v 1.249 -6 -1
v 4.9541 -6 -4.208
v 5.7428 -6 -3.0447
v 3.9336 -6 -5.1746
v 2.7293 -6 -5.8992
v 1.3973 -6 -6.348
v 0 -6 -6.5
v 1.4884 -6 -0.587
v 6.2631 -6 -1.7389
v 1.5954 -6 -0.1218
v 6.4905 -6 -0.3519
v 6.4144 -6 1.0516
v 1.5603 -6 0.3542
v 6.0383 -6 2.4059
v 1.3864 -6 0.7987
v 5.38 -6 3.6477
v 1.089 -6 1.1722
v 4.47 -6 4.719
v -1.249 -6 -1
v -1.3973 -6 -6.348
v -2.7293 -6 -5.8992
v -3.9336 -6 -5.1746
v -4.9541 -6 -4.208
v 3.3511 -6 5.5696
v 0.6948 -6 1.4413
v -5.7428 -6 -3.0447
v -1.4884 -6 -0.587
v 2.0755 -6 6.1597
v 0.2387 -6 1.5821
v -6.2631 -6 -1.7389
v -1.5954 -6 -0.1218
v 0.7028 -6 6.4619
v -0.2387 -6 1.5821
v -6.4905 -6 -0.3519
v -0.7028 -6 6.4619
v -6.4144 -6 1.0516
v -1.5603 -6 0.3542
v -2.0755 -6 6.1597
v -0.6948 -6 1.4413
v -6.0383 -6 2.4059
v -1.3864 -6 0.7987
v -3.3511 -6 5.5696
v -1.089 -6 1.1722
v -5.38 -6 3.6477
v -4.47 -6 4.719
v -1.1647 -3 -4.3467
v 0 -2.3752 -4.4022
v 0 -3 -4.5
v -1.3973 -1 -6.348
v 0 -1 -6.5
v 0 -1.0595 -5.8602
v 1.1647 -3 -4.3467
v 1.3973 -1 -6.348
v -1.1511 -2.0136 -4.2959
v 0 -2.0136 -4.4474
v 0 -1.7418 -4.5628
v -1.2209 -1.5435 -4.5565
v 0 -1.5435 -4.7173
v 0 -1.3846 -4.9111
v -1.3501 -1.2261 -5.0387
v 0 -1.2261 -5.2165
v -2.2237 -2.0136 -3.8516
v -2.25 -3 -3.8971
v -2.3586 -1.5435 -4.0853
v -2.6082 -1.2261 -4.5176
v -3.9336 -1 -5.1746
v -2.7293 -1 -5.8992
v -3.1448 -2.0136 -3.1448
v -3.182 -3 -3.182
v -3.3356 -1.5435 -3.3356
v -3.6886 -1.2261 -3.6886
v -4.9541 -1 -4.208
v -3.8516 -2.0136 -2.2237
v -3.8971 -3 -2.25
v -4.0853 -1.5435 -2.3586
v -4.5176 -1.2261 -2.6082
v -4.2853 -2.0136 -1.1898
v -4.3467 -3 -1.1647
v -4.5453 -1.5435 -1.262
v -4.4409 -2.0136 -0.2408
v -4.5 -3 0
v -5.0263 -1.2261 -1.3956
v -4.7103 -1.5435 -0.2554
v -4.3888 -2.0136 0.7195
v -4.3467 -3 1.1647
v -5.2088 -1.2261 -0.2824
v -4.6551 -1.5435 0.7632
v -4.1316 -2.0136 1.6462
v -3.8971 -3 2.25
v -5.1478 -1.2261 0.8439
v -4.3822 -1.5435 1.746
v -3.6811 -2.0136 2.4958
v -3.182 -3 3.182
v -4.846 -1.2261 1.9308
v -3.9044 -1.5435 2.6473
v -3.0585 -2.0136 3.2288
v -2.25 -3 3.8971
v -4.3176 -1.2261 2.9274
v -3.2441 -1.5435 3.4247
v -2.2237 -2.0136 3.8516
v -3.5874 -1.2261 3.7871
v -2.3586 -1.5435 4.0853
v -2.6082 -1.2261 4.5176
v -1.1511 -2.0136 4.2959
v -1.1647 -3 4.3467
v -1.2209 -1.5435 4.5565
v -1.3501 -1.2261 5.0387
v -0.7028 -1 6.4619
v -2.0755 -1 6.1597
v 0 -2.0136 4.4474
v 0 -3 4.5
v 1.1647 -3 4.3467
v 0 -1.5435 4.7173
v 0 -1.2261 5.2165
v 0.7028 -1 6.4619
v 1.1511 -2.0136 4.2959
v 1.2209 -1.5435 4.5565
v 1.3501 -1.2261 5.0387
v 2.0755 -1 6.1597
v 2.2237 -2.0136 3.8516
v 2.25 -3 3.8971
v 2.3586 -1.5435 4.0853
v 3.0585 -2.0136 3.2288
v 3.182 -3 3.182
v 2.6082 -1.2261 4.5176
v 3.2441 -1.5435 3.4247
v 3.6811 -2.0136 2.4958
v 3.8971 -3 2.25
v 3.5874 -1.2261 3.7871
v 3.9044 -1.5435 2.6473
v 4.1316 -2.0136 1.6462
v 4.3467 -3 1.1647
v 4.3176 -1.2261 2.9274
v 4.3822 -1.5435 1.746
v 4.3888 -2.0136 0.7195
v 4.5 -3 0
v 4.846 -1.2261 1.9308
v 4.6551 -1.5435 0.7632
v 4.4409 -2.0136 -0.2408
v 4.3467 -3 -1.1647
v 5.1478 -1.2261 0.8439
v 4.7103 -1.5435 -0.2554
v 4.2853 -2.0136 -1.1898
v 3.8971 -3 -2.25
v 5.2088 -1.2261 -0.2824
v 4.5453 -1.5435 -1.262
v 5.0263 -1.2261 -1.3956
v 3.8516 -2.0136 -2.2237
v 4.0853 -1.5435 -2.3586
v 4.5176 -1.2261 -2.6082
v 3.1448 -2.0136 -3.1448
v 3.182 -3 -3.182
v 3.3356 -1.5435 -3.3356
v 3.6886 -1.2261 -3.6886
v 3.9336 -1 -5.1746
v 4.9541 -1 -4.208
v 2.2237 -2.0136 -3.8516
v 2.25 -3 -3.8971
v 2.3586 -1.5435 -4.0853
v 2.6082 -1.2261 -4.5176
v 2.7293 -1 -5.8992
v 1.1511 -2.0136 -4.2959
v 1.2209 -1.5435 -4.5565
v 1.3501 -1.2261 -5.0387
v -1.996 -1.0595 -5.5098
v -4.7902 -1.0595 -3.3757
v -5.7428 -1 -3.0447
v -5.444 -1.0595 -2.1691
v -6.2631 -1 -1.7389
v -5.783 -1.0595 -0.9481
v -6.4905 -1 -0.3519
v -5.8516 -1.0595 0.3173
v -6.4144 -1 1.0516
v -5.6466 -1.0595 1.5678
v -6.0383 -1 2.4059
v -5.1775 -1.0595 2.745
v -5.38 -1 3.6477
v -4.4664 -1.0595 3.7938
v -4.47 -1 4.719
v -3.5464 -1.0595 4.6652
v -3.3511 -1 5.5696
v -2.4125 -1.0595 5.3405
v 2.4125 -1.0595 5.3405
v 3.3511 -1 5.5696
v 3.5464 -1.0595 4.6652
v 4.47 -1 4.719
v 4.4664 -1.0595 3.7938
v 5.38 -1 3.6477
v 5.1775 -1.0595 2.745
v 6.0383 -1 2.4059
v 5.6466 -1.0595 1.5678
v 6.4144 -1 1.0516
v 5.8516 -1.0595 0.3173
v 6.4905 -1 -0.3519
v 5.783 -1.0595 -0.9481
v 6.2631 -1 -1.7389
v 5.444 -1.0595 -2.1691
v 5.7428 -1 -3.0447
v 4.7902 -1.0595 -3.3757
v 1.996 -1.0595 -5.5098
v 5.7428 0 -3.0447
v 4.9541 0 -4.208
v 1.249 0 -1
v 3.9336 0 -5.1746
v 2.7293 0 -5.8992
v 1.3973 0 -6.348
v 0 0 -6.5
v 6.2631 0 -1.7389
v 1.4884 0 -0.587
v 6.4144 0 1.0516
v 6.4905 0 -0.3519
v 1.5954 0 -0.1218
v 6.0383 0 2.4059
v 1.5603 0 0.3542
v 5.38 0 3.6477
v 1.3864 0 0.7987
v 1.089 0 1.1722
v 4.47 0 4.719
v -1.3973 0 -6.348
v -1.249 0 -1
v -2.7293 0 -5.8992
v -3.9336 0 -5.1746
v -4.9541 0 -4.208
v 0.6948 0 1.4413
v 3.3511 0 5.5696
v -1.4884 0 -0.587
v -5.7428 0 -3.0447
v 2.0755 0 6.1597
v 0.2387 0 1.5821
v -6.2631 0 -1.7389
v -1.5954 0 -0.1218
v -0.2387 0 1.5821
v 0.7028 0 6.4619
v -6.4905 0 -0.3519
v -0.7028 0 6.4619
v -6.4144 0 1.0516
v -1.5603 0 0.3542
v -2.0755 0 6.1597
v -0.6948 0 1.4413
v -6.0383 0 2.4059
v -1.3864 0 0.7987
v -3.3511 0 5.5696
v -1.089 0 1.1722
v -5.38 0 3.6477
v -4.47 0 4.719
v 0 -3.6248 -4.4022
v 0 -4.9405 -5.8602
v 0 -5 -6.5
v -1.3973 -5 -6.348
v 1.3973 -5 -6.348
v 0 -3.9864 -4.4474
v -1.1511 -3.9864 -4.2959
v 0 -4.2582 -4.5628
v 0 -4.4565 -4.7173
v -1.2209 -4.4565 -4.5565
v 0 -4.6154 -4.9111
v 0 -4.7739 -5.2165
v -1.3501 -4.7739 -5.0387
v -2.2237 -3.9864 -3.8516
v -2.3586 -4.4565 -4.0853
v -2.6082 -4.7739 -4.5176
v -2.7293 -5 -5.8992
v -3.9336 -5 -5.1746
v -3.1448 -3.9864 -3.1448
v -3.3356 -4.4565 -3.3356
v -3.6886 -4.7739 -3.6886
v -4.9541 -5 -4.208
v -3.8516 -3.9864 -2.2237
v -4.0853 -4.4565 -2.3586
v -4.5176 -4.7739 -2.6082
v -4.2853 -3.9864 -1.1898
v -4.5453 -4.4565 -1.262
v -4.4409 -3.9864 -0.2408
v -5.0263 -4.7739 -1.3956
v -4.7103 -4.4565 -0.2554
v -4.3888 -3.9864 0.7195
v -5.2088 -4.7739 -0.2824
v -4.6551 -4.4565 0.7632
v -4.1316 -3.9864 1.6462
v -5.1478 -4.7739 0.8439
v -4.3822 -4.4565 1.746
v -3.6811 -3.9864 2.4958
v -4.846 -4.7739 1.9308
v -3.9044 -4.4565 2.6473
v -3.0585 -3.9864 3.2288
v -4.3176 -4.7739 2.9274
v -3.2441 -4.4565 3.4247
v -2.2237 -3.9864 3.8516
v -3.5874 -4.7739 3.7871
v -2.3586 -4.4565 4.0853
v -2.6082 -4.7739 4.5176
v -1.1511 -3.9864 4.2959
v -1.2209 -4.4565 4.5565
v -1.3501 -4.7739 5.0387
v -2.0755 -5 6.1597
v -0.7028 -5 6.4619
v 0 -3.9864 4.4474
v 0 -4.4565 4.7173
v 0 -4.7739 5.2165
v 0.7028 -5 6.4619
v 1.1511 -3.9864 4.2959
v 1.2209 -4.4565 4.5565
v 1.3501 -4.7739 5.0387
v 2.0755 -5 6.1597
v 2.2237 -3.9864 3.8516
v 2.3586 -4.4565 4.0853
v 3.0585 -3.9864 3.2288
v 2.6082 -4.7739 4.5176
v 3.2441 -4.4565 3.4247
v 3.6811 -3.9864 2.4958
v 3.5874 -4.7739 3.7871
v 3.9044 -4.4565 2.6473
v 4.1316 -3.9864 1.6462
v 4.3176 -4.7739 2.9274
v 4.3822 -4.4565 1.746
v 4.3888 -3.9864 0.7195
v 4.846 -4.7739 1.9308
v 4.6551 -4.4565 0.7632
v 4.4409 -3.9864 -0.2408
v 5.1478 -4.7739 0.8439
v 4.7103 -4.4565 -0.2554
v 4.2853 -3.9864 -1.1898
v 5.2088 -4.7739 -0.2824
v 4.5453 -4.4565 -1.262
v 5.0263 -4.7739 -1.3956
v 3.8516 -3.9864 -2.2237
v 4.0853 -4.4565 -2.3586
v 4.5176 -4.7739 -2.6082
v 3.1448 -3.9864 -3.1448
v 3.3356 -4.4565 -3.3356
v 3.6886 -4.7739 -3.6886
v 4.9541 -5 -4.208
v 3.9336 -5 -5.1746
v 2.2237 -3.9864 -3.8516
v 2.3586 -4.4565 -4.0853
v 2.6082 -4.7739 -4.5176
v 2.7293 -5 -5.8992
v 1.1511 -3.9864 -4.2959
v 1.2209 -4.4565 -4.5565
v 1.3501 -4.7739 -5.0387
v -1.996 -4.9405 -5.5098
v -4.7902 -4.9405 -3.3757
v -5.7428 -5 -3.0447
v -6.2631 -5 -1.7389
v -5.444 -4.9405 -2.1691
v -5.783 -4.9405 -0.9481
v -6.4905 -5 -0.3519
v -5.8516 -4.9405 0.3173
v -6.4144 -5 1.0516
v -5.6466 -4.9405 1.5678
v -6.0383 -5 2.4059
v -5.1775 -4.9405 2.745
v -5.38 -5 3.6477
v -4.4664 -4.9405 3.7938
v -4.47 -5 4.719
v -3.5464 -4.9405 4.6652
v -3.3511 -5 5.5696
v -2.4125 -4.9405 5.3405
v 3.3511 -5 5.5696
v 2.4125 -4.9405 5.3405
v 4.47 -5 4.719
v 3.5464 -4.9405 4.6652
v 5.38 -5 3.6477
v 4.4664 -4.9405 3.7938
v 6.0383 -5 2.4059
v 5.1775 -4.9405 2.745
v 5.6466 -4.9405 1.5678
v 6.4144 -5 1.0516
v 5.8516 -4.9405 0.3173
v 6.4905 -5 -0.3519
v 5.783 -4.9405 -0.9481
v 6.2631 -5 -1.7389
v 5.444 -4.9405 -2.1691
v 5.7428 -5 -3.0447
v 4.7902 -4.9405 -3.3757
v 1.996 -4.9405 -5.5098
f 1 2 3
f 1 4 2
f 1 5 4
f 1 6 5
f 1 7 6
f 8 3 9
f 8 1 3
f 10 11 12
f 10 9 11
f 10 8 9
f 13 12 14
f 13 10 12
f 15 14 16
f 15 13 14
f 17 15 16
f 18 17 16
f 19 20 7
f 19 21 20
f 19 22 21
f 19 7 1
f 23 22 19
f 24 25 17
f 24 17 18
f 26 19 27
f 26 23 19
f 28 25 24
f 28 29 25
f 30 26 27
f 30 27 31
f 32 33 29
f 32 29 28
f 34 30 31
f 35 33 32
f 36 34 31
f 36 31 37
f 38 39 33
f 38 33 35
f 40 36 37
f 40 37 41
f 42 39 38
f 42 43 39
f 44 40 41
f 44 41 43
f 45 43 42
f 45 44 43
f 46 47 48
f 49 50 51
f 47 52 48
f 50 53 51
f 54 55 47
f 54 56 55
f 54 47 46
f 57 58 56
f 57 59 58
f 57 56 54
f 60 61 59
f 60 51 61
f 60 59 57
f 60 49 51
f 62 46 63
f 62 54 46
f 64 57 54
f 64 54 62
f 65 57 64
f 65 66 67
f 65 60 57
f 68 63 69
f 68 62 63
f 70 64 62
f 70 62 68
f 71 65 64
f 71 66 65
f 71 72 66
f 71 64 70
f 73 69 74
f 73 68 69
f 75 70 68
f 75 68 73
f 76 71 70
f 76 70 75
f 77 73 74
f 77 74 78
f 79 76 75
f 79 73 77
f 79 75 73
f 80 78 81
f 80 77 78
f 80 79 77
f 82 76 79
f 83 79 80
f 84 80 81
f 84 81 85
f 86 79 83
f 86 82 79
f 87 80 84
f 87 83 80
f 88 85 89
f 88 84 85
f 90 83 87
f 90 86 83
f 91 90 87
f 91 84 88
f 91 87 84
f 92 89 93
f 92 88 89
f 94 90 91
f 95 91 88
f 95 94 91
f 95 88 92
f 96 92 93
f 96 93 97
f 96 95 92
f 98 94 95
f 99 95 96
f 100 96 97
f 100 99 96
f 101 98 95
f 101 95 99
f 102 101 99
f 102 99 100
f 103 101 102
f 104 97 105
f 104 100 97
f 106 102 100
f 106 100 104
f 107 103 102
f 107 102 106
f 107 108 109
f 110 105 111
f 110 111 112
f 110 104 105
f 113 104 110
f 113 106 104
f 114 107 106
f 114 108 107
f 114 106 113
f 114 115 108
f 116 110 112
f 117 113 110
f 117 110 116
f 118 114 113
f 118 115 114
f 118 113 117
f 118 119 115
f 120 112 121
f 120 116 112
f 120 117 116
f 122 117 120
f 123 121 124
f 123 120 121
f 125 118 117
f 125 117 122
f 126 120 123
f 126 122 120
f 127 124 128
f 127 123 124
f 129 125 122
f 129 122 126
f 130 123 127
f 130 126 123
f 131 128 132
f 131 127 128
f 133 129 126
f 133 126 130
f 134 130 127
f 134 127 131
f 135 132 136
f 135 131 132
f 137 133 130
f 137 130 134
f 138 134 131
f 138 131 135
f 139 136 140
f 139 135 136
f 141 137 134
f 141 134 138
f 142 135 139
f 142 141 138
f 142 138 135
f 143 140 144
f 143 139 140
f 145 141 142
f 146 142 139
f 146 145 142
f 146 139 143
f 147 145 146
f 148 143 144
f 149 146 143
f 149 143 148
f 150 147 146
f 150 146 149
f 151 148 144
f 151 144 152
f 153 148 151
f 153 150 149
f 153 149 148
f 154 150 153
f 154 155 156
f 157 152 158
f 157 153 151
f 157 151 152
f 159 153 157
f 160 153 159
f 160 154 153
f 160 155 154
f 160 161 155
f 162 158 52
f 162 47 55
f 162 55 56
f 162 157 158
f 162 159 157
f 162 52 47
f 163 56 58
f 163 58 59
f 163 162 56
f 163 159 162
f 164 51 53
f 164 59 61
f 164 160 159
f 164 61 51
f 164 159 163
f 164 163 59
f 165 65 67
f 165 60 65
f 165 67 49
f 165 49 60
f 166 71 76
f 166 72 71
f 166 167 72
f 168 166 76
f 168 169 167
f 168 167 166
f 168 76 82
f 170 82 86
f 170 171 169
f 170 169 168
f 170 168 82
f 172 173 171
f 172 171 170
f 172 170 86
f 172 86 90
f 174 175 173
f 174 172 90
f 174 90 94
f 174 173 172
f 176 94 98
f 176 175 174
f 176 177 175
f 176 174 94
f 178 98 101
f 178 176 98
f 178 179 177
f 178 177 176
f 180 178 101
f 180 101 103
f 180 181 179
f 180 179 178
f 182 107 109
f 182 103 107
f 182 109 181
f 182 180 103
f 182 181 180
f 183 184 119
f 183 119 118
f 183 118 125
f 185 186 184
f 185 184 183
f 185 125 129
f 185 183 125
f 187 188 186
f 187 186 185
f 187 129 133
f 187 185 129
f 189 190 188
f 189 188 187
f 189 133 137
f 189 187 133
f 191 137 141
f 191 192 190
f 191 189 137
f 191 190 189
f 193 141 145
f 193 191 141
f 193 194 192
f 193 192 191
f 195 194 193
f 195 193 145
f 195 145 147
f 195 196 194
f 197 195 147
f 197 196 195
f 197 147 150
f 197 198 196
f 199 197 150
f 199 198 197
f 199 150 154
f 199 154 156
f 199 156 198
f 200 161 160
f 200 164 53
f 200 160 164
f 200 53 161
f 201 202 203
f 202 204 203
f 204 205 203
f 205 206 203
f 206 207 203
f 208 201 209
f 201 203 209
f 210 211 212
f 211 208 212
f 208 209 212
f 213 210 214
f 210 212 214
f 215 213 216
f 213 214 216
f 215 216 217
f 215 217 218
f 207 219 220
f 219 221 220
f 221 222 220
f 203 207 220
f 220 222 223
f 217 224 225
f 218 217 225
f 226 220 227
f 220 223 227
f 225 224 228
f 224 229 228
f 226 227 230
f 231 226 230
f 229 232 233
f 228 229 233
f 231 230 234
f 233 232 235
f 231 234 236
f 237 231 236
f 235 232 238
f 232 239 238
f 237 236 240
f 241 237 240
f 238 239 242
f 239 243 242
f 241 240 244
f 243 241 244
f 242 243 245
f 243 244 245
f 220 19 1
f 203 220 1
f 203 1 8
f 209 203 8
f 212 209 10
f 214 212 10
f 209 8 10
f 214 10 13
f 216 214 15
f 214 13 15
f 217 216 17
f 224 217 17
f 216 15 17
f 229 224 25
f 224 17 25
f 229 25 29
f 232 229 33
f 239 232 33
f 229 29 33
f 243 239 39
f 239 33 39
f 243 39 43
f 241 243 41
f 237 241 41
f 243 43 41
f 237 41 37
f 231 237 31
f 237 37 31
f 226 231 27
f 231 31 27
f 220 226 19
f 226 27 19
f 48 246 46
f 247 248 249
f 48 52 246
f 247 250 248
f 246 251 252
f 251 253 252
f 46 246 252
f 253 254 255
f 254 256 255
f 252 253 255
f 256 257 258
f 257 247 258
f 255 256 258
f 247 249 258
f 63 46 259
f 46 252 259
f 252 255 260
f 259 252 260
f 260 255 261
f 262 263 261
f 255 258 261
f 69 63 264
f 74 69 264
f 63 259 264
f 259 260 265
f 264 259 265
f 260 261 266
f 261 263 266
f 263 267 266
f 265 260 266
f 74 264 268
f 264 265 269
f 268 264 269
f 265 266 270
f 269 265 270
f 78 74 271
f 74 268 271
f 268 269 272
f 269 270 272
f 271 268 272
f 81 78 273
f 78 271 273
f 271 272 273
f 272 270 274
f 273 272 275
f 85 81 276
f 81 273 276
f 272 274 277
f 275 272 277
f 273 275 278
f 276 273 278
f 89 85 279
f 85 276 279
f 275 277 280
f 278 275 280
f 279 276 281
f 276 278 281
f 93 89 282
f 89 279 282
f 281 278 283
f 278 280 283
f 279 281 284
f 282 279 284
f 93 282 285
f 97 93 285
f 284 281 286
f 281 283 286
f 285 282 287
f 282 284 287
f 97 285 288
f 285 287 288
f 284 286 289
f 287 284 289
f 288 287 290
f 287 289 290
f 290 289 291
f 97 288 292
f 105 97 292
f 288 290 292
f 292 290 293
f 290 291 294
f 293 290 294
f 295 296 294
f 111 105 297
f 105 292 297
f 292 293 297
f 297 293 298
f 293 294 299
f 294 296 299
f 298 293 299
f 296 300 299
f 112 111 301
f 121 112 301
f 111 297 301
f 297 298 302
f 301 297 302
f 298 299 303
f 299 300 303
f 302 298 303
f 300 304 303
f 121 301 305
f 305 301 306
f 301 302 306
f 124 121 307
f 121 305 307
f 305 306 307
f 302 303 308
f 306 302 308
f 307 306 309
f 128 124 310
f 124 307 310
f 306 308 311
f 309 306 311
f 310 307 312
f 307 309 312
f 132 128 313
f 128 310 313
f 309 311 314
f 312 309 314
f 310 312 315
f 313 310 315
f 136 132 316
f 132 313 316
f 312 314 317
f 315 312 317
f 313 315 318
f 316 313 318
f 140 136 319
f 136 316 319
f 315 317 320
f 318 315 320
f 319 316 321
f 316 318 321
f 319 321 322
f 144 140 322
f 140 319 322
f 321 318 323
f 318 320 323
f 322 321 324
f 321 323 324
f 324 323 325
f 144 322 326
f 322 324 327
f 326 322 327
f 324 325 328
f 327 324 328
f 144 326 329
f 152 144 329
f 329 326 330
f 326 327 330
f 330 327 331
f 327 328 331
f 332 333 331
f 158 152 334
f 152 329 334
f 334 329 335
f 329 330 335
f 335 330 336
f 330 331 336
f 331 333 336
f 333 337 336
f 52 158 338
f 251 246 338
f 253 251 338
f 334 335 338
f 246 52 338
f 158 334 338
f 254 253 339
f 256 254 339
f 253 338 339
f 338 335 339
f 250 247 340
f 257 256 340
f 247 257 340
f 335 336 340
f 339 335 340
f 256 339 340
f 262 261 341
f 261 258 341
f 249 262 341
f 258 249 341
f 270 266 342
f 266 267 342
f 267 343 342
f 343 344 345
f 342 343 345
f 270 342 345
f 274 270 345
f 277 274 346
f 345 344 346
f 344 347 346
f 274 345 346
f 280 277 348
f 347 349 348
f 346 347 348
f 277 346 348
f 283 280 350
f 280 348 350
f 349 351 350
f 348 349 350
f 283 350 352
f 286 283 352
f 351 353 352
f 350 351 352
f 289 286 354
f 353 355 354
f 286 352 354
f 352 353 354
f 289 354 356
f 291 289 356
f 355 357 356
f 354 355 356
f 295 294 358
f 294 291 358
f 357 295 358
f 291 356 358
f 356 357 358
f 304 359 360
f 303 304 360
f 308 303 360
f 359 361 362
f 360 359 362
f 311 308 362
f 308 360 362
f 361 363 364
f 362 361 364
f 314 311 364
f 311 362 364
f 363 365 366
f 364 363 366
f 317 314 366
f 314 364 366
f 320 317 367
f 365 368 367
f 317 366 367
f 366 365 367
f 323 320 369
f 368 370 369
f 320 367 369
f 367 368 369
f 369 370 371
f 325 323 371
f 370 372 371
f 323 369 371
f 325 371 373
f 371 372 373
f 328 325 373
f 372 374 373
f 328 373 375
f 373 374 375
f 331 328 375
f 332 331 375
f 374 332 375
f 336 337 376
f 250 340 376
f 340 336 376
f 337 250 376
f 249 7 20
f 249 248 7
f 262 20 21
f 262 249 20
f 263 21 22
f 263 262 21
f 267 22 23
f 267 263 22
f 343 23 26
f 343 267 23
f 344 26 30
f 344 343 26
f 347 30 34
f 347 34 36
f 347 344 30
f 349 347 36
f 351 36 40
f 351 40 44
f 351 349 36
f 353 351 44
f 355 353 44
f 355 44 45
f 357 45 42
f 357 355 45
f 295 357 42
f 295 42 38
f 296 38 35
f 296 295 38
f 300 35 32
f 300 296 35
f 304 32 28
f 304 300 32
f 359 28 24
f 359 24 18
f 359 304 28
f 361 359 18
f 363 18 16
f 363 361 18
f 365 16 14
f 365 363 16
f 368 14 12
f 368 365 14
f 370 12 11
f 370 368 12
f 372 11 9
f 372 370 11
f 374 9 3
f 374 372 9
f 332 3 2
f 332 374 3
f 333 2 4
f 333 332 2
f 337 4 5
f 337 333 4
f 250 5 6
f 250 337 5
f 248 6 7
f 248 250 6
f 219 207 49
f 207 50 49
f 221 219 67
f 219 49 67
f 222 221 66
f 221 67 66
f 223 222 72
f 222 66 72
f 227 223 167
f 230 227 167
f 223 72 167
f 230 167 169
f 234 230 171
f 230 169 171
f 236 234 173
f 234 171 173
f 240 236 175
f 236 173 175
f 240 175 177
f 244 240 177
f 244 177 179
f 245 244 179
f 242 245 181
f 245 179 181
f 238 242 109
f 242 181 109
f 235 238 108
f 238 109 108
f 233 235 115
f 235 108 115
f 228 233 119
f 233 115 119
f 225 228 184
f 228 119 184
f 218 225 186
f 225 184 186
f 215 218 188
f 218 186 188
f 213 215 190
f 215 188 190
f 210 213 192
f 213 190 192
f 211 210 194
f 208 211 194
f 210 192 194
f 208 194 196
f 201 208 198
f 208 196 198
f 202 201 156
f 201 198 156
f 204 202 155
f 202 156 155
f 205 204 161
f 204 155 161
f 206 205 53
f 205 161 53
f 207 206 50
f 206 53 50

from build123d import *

# Parameters (mm, degrees)
CUT_EXTRUDE1_START = -6
CUT_EXTRUDE1_DEPTH = 17.977249318


with BuildPart() as part:
    # Sketch1 → Revolve1 (revolve)
    with BuildSketch(Plane.XY, mode=Mode.PRIVATE) as revolve1_sk:
        with BuildLine():
            Line((0, 0), (-6.5, 0))
            Line((-6.5, 0), (-6.5, -1))
            add(Edge.make_bspline(
                [(-4.5, -3), (-4.002607285, -1.25459372), (-5.515250155, -1.047243271), (-6.5, -1)],
                knots=[0, 0, 0, 0, 1, 1, 1, 1], degree=3))
            Line((-4.5, -3), (0, -3))
            Line((0, -3), (0, 0))
        make_face()
    revolve1 = revolve(revolve1_sk.sketch.rotate(Axis((0, -3, 0), (0, 1, 0)), 270), axis=Axis((0, -3, 0), (0, 1, 0)))

    # Mirror1: Revolve1 across plane
    add(revolve1.mirror(Plane(origin=(-4.5, -3, 0), x_dir=(0, 0, 1), z_dir=(0, 1, 0))))

    # Sketch2 → Cut-Extrude1 (cut, through all)
    with BuildSketch(Plane(origin=(0, 0, 0), x_dir=(1, 0, 0), z_dir=(0, 1, 0)).offset(CUT_EXTRUDE1_START)):
        with BuildLine():
            Line((-1.2489996, 1), (1.2489996, 1))
            ThreePointArc((1.2489996, 1), (0, -1.6), (-1.2489996, 1))
        make_face()
    extrude(amount=CUT_EXTRUDE1_DEPTH, mode=Mode.SUBTRACT)


solid = part.part
